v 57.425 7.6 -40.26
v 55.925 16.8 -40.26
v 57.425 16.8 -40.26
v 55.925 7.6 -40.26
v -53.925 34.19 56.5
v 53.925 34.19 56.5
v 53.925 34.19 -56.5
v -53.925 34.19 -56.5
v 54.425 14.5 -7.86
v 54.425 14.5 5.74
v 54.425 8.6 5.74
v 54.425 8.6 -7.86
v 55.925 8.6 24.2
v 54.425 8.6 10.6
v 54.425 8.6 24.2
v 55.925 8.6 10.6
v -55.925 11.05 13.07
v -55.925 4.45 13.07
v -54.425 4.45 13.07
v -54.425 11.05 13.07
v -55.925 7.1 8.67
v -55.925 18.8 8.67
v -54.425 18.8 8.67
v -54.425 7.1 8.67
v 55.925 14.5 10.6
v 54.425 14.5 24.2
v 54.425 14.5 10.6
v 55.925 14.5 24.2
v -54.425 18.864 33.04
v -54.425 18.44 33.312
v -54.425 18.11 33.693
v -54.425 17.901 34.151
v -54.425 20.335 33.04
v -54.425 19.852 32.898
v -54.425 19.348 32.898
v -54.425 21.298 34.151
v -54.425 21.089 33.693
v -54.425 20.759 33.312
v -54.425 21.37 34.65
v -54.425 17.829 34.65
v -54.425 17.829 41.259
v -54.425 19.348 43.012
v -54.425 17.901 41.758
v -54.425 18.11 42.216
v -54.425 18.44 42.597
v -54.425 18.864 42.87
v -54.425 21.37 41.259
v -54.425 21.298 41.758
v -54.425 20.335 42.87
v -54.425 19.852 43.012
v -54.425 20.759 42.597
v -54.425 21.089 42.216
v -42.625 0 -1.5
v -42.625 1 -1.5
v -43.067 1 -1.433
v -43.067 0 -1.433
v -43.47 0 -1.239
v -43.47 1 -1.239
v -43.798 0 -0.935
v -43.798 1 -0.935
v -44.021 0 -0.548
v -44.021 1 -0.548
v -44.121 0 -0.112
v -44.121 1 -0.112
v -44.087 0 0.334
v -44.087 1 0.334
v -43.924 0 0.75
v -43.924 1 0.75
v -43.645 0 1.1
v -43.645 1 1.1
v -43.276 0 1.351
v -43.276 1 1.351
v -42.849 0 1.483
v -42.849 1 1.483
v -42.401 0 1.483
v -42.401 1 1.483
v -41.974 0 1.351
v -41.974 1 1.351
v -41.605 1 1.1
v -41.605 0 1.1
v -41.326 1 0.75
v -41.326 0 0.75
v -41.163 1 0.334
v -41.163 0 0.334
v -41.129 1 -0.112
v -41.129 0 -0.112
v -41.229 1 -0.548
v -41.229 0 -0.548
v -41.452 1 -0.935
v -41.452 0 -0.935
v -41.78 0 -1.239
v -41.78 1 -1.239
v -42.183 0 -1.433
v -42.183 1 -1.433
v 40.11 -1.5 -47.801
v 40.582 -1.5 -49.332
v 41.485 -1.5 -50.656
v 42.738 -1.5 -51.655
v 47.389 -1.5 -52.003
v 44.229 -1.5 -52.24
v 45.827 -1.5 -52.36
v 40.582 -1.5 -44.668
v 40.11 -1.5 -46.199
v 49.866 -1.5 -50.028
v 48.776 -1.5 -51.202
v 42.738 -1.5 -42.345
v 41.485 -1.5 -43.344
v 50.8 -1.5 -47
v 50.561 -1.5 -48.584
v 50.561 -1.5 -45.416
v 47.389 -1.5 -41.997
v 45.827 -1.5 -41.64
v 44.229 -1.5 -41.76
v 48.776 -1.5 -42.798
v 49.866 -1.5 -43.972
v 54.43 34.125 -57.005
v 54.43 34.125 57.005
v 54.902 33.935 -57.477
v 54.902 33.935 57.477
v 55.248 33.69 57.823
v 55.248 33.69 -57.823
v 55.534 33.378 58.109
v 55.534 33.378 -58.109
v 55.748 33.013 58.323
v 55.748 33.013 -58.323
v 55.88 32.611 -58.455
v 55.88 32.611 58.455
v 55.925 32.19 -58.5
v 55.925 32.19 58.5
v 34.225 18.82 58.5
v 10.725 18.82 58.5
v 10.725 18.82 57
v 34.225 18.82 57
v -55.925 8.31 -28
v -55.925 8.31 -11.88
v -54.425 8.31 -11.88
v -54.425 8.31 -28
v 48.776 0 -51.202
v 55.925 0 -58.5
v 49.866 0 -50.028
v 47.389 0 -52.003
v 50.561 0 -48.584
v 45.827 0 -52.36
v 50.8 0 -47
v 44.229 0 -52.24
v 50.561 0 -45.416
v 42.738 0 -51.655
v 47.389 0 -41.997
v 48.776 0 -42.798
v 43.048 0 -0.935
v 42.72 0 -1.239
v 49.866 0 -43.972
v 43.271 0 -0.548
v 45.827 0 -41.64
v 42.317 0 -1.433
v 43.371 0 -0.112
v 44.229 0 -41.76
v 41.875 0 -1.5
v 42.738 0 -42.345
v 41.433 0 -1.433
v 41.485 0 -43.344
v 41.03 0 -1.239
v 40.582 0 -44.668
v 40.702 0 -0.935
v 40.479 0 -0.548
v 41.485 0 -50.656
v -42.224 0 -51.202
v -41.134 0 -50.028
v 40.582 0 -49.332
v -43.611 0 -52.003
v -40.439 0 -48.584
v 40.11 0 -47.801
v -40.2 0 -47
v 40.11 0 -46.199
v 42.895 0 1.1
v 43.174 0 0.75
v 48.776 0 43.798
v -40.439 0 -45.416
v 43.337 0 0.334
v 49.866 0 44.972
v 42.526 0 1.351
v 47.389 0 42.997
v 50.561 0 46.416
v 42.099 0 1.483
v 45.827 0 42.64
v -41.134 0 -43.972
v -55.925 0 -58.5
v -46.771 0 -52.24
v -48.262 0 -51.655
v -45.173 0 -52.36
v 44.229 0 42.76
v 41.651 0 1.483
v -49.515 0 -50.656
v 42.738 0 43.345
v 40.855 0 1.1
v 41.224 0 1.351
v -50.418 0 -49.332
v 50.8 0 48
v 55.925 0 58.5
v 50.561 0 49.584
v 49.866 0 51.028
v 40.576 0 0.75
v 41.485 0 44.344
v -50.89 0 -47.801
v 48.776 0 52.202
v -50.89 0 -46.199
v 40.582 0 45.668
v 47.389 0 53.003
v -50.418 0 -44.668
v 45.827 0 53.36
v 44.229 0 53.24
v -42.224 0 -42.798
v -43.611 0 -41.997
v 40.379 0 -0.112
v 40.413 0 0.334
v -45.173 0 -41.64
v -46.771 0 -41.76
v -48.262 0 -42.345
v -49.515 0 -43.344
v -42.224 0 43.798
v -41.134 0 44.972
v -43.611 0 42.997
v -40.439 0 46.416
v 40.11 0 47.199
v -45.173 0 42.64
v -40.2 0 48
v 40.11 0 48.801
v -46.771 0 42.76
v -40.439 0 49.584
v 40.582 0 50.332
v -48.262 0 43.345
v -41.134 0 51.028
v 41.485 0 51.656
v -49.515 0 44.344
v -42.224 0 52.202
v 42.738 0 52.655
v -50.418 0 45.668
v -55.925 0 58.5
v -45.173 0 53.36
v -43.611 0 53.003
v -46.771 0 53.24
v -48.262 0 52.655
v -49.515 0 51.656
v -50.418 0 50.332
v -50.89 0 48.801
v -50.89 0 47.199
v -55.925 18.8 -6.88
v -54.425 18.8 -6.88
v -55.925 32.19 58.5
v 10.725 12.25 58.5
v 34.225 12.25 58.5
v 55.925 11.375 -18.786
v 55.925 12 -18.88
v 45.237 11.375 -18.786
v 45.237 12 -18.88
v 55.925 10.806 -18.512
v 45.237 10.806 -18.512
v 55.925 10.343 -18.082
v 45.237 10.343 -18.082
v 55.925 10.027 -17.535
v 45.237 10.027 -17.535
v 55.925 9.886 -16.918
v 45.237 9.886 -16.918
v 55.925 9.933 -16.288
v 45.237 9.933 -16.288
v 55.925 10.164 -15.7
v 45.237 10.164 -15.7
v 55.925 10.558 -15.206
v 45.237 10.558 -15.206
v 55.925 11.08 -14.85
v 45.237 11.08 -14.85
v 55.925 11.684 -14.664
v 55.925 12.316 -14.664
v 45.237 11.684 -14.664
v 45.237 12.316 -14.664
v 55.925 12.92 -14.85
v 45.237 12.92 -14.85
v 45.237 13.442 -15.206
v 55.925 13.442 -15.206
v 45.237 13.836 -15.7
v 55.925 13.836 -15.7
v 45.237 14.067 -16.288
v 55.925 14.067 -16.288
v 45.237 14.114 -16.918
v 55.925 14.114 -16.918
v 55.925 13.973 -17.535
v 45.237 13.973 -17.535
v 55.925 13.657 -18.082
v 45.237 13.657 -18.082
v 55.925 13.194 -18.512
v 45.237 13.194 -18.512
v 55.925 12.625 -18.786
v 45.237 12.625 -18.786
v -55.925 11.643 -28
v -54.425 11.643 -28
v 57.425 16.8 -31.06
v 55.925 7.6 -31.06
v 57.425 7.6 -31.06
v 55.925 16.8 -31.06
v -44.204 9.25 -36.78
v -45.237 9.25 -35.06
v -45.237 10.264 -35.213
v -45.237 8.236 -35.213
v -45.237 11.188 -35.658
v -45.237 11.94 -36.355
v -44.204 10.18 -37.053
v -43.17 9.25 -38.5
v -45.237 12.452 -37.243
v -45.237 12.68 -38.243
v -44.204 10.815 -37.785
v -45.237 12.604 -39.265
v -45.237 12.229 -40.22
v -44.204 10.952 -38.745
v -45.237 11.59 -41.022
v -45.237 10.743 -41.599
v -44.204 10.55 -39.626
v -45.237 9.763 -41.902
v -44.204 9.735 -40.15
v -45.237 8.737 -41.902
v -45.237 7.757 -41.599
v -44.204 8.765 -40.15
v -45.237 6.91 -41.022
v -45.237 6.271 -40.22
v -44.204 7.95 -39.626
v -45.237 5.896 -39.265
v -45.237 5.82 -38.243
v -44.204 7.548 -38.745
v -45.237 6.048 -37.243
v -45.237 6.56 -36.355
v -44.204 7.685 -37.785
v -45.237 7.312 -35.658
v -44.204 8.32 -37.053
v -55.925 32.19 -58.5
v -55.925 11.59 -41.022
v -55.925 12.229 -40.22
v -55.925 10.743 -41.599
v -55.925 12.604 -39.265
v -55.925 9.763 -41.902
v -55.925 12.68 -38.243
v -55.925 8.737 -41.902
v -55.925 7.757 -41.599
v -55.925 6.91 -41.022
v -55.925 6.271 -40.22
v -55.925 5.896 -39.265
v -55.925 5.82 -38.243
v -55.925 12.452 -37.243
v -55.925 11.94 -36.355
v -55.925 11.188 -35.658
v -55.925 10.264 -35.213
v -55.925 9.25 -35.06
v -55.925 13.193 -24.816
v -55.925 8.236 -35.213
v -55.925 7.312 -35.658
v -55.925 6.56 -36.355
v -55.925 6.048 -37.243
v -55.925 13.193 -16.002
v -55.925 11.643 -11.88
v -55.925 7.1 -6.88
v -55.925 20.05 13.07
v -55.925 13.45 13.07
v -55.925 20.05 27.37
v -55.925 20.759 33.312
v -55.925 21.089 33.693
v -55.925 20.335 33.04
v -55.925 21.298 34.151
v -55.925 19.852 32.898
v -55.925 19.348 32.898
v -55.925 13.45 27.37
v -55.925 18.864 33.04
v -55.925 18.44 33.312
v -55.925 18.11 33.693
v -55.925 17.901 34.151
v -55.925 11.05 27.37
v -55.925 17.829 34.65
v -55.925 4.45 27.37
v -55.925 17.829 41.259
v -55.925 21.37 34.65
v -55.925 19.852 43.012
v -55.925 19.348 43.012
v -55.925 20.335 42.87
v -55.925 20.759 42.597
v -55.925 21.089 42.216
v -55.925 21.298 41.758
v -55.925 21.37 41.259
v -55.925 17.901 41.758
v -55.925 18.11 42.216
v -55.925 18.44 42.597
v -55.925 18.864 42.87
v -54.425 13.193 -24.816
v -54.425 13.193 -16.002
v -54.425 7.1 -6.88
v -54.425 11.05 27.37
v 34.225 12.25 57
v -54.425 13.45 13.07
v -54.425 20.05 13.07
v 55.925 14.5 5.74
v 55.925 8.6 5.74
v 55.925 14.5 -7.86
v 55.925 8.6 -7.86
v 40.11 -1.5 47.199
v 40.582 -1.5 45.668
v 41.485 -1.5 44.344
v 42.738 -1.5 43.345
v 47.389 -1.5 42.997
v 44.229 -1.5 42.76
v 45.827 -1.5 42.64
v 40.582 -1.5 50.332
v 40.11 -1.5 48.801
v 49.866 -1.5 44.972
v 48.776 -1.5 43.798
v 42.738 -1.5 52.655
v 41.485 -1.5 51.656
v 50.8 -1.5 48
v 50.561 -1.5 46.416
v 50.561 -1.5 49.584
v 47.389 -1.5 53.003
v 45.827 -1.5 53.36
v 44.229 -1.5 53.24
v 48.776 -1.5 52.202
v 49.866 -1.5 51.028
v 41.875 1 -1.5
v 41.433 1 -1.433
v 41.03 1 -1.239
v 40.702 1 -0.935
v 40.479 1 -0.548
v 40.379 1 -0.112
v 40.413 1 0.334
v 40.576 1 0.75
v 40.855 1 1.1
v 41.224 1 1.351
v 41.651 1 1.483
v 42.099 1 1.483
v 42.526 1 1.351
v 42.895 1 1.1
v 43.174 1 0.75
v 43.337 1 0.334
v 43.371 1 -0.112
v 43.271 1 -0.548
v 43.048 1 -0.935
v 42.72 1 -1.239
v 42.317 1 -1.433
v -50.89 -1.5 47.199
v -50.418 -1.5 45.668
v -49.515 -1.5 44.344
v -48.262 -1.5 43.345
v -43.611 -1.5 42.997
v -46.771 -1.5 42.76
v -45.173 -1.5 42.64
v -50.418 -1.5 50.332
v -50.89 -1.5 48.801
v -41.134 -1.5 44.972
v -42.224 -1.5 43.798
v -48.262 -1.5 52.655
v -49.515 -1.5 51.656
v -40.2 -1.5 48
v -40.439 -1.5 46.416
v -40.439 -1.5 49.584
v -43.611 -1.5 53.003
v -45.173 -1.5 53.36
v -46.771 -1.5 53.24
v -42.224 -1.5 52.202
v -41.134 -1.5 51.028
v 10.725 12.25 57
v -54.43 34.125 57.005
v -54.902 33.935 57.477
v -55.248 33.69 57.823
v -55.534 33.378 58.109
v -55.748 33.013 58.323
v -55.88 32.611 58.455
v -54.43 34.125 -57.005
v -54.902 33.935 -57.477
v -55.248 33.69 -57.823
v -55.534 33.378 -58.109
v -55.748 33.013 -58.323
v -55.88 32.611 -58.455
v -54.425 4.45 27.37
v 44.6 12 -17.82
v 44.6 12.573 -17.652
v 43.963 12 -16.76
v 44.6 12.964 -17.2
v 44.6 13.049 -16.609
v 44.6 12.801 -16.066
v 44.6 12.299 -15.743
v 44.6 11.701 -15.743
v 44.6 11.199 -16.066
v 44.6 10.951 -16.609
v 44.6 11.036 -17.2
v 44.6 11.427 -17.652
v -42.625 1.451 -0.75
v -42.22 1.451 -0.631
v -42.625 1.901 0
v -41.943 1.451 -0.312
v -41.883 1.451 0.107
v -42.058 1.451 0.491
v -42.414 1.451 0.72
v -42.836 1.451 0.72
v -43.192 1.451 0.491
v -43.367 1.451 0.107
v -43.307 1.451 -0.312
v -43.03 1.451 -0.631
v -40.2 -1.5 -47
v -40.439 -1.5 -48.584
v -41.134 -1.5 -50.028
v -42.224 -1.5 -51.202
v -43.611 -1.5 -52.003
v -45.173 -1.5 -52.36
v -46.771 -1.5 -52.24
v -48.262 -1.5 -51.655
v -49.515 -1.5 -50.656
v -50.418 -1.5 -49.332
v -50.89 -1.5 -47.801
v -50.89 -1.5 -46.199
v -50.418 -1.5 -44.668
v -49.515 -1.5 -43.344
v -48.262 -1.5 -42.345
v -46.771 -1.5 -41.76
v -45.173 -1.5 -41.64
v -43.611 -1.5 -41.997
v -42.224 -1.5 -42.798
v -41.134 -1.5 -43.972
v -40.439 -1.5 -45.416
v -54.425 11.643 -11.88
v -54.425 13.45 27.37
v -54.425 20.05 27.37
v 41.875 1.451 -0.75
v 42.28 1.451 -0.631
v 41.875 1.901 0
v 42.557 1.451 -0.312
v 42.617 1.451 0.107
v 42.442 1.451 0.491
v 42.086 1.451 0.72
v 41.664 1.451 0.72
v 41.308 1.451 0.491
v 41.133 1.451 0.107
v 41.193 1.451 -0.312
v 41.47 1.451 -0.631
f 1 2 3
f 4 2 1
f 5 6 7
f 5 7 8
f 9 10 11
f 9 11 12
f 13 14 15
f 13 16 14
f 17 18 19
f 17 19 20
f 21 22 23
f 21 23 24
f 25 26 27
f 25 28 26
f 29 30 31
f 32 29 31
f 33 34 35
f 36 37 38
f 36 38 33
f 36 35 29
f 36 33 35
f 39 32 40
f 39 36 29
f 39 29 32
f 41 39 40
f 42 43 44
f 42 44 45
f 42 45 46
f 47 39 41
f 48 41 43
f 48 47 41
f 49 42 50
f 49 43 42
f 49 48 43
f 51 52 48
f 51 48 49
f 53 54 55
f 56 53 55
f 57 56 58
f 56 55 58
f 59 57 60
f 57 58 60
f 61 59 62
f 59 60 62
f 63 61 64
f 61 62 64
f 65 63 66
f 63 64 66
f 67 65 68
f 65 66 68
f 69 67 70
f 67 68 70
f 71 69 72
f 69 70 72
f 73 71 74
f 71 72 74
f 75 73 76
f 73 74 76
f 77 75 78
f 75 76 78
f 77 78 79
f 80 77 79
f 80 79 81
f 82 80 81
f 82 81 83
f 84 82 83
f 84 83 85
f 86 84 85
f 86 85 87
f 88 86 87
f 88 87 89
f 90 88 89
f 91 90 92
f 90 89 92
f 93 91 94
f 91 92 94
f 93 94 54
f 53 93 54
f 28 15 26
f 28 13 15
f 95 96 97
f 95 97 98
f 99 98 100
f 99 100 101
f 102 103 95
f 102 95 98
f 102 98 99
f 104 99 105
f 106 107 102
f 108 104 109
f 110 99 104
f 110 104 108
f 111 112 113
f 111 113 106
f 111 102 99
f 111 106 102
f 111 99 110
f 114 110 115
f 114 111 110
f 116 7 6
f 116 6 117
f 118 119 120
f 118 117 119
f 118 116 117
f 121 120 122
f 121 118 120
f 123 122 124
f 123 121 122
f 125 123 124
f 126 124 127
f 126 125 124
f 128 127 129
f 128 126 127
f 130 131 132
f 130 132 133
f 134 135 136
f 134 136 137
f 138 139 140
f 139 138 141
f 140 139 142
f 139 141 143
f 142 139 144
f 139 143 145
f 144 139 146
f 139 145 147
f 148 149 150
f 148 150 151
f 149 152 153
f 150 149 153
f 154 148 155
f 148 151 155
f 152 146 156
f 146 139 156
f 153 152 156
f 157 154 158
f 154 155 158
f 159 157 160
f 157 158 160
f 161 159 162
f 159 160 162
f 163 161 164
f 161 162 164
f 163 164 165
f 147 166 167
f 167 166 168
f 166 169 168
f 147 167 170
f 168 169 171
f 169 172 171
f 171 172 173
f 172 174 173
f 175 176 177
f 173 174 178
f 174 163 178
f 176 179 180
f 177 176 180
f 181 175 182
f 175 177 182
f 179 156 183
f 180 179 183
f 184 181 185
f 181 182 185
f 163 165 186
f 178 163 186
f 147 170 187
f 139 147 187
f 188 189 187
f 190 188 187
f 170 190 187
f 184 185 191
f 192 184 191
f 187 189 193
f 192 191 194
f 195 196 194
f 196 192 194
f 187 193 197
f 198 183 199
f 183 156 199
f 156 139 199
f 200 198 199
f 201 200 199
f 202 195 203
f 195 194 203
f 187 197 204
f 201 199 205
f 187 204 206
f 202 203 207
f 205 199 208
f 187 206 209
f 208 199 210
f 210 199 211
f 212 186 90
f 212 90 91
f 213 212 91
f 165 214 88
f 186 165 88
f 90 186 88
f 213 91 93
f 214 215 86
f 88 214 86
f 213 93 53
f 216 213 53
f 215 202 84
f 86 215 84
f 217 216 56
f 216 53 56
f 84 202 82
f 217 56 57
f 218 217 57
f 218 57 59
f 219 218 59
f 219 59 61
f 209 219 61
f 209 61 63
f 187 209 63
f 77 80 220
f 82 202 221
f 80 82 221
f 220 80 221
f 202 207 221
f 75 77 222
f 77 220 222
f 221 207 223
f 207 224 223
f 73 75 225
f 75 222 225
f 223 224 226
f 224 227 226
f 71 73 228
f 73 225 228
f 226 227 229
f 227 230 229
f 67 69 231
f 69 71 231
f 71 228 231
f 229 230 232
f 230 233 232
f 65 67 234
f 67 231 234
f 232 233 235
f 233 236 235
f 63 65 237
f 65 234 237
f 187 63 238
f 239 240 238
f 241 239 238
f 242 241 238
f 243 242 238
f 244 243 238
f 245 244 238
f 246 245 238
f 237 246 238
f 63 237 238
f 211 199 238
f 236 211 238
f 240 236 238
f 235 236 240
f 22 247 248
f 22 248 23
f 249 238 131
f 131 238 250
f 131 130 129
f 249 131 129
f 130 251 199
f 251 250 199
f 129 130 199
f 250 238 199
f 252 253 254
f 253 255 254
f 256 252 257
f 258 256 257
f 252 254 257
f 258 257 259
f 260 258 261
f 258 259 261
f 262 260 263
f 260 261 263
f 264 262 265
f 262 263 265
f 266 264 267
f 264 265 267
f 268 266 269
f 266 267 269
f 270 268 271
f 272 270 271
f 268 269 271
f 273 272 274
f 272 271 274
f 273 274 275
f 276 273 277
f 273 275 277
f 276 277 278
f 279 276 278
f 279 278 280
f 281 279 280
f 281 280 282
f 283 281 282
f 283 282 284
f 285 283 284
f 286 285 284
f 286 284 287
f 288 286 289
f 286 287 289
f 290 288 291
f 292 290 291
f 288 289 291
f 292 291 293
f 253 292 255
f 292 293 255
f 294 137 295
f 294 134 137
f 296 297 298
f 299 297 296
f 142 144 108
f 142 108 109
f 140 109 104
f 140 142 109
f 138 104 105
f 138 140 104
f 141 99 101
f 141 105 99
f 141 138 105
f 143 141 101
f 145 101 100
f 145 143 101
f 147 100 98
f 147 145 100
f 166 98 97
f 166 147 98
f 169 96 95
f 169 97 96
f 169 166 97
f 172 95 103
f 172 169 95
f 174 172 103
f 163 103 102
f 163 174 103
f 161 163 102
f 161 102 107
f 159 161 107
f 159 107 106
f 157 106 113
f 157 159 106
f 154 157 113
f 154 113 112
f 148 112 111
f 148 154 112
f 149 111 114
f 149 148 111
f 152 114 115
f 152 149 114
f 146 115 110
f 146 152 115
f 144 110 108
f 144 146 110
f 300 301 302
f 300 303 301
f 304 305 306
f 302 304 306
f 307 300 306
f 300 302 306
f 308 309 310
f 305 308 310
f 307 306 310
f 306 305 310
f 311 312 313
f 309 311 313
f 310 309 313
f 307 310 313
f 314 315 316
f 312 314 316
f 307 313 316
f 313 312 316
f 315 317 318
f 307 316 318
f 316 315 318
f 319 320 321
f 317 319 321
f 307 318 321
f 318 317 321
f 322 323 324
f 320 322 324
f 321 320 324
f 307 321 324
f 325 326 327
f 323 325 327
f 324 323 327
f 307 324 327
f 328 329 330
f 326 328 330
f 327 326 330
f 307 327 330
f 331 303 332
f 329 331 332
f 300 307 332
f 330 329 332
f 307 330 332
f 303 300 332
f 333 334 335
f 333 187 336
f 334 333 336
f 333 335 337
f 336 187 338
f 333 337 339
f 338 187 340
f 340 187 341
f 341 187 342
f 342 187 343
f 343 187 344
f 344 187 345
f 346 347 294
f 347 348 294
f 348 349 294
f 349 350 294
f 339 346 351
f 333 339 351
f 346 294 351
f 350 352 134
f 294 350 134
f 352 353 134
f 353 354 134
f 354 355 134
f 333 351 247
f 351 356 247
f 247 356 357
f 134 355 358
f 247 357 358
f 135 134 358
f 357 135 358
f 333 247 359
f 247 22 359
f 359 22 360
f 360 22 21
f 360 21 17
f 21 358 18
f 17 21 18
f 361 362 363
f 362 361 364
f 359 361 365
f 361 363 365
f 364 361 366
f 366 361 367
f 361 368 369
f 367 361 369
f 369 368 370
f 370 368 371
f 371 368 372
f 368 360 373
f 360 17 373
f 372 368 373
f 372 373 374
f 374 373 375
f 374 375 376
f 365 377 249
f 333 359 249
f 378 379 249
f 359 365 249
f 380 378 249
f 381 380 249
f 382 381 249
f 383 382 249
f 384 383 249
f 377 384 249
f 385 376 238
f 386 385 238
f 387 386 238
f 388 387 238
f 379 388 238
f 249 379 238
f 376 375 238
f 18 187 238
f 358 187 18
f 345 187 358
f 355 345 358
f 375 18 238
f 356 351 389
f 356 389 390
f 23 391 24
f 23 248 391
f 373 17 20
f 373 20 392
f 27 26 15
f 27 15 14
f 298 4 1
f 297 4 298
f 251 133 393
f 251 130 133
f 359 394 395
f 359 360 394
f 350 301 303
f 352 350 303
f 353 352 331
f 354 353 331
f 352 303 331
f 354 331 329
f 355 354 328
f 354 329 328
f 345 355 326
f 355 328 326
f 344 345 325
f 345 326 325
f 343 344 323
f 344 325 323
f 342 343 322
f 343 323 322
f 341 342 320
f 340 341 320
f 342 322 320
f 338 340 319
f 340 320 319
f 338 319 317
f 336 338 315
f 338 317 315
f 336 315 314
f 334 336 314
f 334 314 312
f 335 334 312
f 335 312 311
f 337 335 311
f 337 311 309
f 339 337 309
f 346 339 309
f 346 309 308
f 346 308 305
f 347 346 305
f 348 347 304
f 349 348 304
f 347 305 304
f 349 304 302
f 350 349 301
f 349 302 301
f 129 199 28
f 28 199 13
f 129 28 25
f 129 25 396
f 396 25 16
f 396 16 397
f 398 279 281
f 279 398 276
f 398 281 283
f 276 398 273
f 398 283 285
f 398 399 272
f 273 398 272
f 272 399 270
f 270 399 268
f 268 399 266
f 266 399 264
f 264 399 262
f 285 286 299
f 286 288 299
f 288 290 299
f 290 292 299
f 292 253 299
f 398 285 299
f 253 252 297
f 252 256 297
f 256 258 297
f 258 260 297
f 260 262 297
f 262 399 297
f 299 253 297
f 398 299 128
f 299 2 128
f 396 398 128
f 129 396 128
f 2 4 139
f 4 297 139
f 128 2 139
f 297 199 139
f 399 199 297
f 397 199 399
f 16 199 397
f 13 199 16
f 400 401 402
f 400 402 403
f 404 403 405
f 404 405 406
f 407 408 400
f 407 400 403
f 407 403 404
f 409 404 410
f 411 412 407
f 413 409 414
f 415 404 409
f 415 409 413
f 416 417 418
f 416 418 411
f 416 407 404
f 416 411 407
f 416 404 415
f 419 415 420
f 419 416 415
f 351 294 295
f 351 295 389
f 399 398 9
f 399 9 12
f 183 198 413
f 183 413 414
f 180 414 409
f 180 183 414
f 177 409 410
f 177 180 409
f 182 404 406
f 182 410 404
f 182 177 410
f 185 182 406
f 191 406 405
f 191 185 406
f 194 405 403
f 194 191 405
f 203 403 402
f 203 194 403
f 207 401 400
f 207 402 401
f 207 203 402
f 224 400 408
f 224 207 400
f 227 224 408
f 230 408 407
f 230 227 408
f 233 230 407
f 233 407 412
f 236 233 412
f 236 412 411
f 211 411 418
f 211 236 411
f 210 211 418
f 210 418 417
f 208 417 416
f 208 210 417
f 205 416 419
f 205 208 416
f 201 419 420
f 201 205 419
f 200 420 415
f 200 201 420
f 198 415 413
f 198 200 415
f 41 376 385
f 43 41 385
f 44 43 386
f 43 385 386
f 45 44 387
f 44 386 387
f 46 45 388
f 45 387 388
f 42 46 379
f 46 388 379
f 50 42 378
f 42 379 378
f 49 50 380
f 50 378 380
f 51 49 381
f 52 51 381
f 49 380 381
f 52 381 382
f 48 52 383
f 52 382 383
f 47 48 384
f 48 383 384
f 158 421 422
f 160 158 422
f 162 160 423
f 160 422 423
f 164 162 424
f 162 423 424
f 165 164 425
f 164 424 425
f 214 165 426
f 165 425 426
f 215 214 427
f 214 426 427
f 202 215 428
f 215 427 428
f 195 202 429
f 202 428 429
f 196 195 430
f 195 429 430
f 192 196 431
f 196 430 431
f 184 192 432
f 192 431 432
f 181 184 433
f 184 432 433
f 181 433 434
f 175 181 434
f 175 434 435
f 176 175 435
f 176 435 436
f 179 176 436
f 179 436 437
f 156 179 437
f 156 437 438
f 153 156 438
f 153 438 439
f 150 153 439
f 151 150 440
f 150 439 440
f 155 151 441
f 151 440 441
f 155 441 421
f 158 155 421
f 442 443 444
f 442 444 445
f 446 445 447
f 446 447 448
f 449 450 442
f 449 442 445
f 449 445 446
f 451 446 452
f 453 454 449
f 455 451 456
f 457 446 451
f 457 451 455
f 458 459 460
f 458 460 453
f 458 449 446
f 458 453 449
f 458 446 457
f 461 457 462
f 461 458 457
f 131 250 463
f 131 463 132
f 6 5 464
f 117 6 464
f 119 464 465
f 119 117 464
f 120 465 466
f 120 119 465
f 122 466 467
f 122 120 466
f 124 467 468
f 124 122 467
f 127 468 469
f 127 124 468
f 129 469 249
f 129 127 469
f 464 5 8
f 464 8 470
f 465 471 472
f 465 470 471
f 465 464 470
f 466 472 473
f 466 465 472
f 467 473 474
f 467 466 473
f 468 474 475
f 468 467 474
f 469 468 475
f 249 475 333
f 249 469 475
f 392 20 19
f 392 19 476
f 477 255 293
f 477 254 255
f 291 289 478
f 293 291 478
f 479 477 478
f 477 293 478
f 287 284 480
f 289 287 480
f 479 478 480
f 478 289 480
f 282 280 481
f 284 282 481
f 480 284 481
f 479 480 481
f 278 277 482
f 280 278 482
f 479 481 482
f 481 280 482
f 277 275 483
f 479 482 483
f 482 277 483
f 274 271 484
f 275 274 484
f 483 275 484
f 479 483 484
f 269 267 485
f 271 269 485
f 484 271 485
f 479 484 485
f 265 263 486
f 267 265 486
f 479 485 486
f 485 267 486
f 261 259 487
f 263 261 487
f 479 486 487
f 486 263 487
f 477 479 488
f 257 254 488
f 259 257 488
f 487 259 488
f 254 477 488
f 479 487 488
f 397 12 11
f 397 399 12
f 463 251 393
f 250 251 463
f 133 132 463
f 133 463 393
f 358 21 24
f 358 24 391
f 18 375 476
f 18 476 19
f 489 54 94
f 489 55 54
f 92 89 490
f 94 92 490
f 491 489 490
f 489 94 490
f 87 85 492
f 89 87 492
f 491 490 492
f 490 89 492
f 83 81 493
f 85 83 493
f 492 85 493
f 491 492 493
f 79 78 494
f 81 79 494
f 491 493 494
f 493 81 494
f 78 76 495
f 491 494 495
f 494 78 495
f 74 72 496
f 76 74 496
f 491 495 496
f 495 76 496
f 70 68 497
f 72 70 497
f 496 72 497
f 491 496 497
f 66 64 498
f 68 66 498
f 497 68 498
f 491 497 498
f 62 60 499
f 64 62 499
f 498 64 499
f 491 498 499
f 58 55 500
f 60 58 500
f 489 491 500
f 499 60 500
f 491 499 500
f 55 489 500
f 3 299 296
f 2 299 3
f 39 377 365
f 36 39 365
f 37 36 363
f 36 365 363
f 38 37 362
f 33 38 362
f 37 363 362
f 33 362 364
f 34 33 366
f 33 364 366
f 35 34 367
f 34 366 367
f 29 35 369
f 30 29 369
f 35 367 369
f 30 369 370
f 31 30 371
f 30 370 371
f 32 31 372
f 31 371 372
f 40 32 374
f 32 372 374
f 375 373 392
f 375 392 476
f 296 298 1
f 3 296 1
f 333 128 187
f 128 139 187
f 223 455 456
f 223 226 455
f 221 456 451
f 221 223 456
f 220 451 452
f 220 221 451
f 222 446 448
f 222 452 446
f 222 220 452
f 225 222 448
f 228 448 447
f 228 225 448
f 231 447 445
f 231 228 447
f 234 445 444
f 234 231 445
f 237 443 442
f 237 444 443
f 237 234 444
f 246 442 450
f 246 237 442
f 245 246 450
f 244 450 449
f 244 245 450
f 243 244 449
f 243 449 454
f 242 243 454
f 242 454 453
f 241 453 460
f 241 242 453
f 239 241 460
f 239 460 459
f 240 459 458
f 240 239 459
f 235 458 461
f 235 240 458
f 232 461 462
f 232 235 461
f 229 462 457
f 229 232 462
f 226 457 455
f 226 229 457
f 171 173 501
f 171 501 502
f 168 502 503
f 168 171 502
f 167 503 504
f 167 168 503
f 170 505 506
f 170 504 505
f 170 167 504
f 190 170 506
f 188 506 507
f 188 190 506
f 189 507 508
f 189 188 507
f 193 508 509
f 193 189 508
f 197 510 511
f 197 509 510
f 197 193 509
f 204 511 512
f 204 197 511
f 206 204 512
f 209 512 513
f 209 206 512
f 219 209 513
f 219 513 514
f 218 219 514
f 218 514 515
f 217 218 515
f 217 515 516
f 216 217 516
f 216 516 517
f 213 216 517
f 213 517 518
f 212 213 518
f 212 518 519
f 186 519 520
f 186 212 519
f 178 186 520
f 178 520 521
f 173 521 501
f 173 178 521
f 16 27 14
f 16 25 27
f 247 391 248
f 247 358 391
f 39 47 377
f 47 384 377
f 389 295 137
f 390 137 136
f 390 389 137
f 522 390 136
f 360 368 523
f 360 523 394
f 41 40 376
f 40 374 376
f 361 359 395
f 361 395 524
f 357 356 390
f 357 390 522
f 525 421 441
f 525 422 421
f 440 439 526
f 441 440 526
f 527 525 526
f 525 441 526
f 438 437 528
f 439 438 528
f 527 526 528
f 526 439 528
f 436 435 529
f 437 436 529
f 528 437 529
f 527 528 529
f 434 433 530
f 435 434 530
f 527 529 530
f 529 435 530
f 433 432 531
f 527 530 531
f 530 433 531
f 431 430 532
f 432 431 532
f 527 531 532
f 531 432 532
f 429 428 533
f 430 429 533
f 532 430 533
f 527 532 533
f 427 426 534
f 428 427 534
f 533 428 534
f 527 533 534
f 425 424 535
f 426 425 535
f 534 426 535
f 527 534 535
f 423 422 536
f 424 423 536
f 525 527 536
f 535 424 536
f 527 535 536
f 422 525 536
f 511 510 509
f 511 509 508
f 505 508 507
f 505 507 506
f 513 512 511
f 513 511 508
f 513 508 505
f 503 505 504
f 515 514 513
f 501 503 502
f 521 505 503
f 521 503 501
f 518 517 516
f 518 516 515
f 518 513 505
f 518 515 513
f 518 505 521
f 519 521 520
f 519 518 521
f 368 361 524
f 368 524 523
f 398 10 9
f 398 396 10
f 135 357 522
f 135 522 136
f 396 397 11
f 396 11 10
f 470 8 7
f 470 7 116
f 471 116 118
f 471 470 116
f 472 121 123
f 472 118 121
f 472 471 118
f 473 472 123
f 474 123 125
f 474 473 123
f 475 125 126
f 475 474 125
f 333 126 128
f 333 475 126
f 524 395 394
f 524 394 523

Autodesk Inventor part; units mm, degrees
ref_plane "YZ Plane" through (0, 0, 0) normal (1, 0, 0) x (0, 1, 0)
ref_plane "XZ Plane" through (0, 0, 0) normal (0, 1, 0) x (-1, 0, 0)
ref_plane "XY Plane" through (0, 0, 0) normal (0, 0, 1) x (1, 0, 0)
sketch "Sketch1" plane through (0, 0, 0) normal (0, 1, 0) x (-1, 0, 0)
  line L0 (55.925, 58.5) -> (-55.925, 58.5)
  line L1 (-55.925, 58.5) -> (-55.925, -58.5)
  line L2 (-55.925, -58.5) -> (55.925, -58.5)
  line L3 (55.925, -58.5) -> (55.925, 58.5)
  line L4 (55.925, 58.5) -> (-55.925, -58.5) construction
  line L5 (-55.925, 58.5) -> (55.925, -58.5) construction
  point P0 (0, 0)
  dimension "d0" = 111.85
  dimension "d1" = 117
extrude "Extrusion1" add sketch "Sketch1" along normal blind 34.19
fillet "Fillet1" radius 2 4 edges at (0, 34.19, 58.5) (55.925, 34.19, 0) (0, 34.19, -58.5) (-55.925, 34.19, 0)
sketch "Sketch2" plane through (0, 0, 0) normal (0, -1, 0) x (1, 0, 0)
  circle A0 centre (45.425, 48) radius 5.375
  line L0 (55.925, 58.5) -> (55.925, -58.5) projected
  line L1 (-55.925, 58.5) -> (55.925, 58.5) projected
  circle A1 centre (-45.575, 48) radius 5.375
  circle A2 centre (45.425, -47) radius 5.375
  circle A3 centre (-45.575, -47) radius 5.375
  point P0 (0, 0)
  dimension "d5" = 10.75
  dimension "d6" = 10.5
  dimension "d7" = 10.5
  dimension "d10" = 91
  dimension "d13" = 95
extrude "Extrusion2" add sketch "Sketch2" along normal blind 1.5
sketch "Sketch4" plane through (0, 0, 0) normal (0, -1, 0) x (1, 0, 0)
  line L0 (-55.925, -58.5) -> (-55.925, 58.5) projected
  line L1 (-55.925, 58.5) -> (55.925, 58.5) projected
  point P0 (0, 0)
  point P1 (-42.625, 0)
  dimension "d32" = 13.3
  dimension "d33" = 58.5
hole "Hole2" at (-42.625, 0, 0) direction (0, 1, 0) diameter 3 depth 1 tip angle 118
pattern_linear "Rectangular Pattern1" count 2 spacing 84.5 along (1, 0, 0) of "Hole2"
sketch "Sketch5" plane through (55.925, 0, 58.5) normal (1, 0, 0) x (0, 0, -1)
  line L0 (34.3, 14.5) -> (47.9, 14.5)
  line L1 (47.9, 14.5) -> (47.9, 8.6)
  line L2 (47.9, 8.6) -> (34.3, 8.6)
  line L3 (34.3, 8.6) -> (34.3, 14.5)
  line L4 (34.3, 14.5) -> (47.9, 8.6) construction
  line L5 (47.9, 14.5) -> (34.3, 8.6) construction
  line L6 (52.76, 14.5) -> (66.36, 14.5)
  line L7 (66.36, 14.5) -> (66.36, 8.6)
  line L8 (66.36, 8.6) -> (52.76, 8.6)
  line L9 (52.76, 8.6) -> (52.76, 14.5)
  line L10 (52.76, 14.5) -> (66.36, 8.6) construction
  line L11 (66.36, 14.5) -> (52.76, 8.6) construction
  line L12 (0, 0) -> (117, 0) projected
  line L13 (0, 0) -> (0, 32.19) projected
  point P0 (58.5, 0)
  point P1 (41.1, 11.55)
  point P2 (59.56, 11.55)
  dimension "d37" = 13.6
  dimension "d38" = 5.9
  dimension "d39" = 13.6
  dimension "d40" = 5.9
  dimension "d41" = 8.6
  dimension "d42" = 34.3
  dimension "d43" = 4.86
  dimension "d44" = 8.6
extrude "Extrusion3" cut sketch "Sketch5" against normal blind 1.5
sketch "Sketch6" plane through (55.925, 0, 58.5) normal (1, 0, 0) x (0, 0, -1)
  line L0 (66.36, 14.5) -> (66.36, 8.6) projected
  line L1 (0, 0) -> (117, 0) projected
  point P0 (58.5, 0)
  point P1 (75.26, 12)
  dimension "d54" = 8.9
  dimension "d55" = 12
hole "Hole3" at (55.925, 12, -16.76) direction (-1, 0, 0) diameter 4.24 depth 10.688 tip angle 118
sketch "Sketch7" plane through (-55.925, 0, -58.5) normal (-1, 0, 0) x (0, 0, 1)
  line L0 (0, 0) -> (117, 0) projected
  line L1 (0, 0) -> (0, 32.19) projected
  point P0 (58.5, 0)
  point P1 (20, 9.25)
  dimension "d56" = 9.25
  dimension "d64" = 20
hole "Hole4" at (-55.925, 9.25, -38.5) direction (1, 0, 0) diameter 6.88 depth 10.688 tip angle 118
sketch "Sketch8" plane through (-55.925, 0, -58.5) normal (-1, 0, 0) x (0, 0, 1)
  line L0 (33.6837, 13.1926) -> (42.498, 13.1926)
  line L1 (46.62, 11.6426) -> (46.62, 8.31)
  line L2 (46.62, 8.31) -> (30.5, 8.31)
  line L3 (30.5, 8.31) -> (30.5, 11.6426)
  line L4 (30.5, 14.87) -> (46.62, 8.31) construction
  line L5 (46.62, 14.87) -> (30.5, 8.31) construction
  circle A0 centre (20, 9.25) radius 3.44 projected
  line L6 (0, 0) -> (117, 0) projected
  line L7 (30.5, 11.6426) -> (33.6837, 13.1926)
  line L8 (42.498, 13.1926) -> (46.62, 11.6426)
  point P0 (58.5, 0)
  point P1 (38.56, 11.59)
  dimension "d65" = 16.12
  dimension "d66" = 6.56
  dimension "d67" = 10.5
  dimension "d68" = 8.31
  dimension "d69" = 1.55
  dimension "d70" = 1.55
  dimension "d71" = 8.8143
extrude "Extrusion4" cut sketch "Sketch8" against normal blind 1.5 contours L0 L8 L1 L2 L3 L7
sketch "Sketch10" plane through (-55.925, 0, -58.5) normal (-1, 0, 0) x (0, 0, 1)
  line L0 (51.62, 18.8) -> (67.17, 18.8)
  line L1 (67.17, 18.8) -> (67.17, 7.1)
  line L2 (67.17, 7.1) -> (51.62, 7.1)
  line L3 (51.62, 7.1) -> (51.62, 18.8)
  line L4 (51.62, 18.8) -> (67.17, 7.1) construction
  line L5 (67.17, 18.8) -> (51.62, 7.1) construction
  line L6 (46.62, 11.6426) -> (46.62, 8.31) projected
  line L7 (0, 0) -> (117, 0) projected
  point P0 (58.5, 0)
  point P1 (59.395, 12.95)
  dimension "d81" = 15.55
  dimension "d82" = 11.7
  dimension "d84" = 5
  dimension "d85" = 7.1
extrude "Extrusion5" cut sketch "Sketch10" against normal blind 1.5
sketch "Sketch11" plane through (-55.925, 0, -58.5) normal (-1, 0, 0) x (0, 0, 1)
  line L0 (71.57, 20.05) -> (85.87, 20.05)
  line L1 (85.87, 20.05) -> (85.87, 13.45)
  line L2 (85.87, 13.45) -> (71.57, 13.45)
  line L3 (71.57, 13.45) -> (71.57, 20.05)
  line L4 (71.57, 20.05) -> (85.87, 13.45) construction
  line L5 (85.87, 20.05) -> (71.57, 13.45) construction
  line L6 (0, 32.19) -> (117, 32.19) projected
  line L7 (67.17, 18.8) -> (67.17, 7.1) projected
  line L8 (71.57, 11.05) -> (85.87, 11.05)
  line L9 (85.87, 11.05) -> (85.87, 4.45)
  line L10 (85.87, 4.45) -> (71.57, 4.45)
  line L11 (71.57, 4.45) -> (71.57, 11.05)
  point P0 (58.5, 0)
  point P1 (78.72, 16.75)
  point P2 (79.72, 17.75)
  dimension "d88" = 14.3
  dimension "d89" = 6.6
  dimension "d90" = 12.14
  dimension "d91" = 4.4
  dimension "d92" = 14.3
  dimension "d93" = 6.6
  dimension "d94" = 2.4
  dimension "d95" = 4.4
extrude "Extrusion6" cut sketch "Sketch11" against normal blind 1.5
sketch "Sketch12" plane through (-55.925, 0, -58.5) normal (-1, 0, 0) x (0, 0, 1)
  line L0 (93.15, 19.5997) -> (99.7593, 19.5997) construction
  line L1 (93.15, 17.8293) -> (99.7593, 17.8293)
  line L2 (99.7593, 21.37) -> (93.15, 21.37)
  arc A0 (93.15, 21.37) -> (93.15, 17.8293) centre (93.15, 19.5997) ccw
  arc A1 (99.7593, 17.8293) -> (99.7593, 21.37) centre (99.7593, 19.5997) ccw
  line L3 (0, 32.19) -> (117, 32.19) projected
  line L4 (85.87, 20.05) -> (85.87, 13.45) projected
  point P0 (58.5, 0)
  point P1 (96.4547, 19.5997)
  dimension "d98" = 10.15
  dimension "d99" = 10.82
  dimension "d100" = 7.28
extrude "Extrusion7" cut sketch "Sketch12" against normal blind 1.5
sketch "Sketch13" plane through (55.925, 0, 58.5) normal (1, 0, 0) x (0, 0, -1)
  line L0 (89.56, 16.8) -> (98.76, 16.8)
  line L1 (98.76, 16.8) -> (98.76, 7.6)
  line L2 (98.76, 7.6) -> (89.56, 7.6)
  line L3 (89.56, 7.6) -> (89.56, 16.8)
  line L4 (89.56, 16.8) -> (98.76, 7.6) construction
  line L5 (98.76, 16.8) -> (89.56, 7.6) construction
  circle A0 centre (75.26, 12) radius 2.12 projected
  line L6 (0, 0) -> (117, 0) projected
  point P0 (58.5, 0)
  point P1 (94.16, 12.2)
  dimension "d103" = 14.3
  dimension "d104" = 7.6
  dimension "d105" = 9.2
  dimension "d106" = 9.2
extrude "Extrusion8" add sketch "Sketch13" along normal blind 1.5 contours L0 L1 L2 L3
sketch "Sketch14" plane through (-55.925, 0, 58.5) normal (0, 0, 1) x (1, 0, 0)
  line L0 (66.65, 18.82) -> (90.15, 18.82)
  line L1 (90.15, 18.82) -> (90.15, 12.25)
  line L2 (90.15, 12.25) -> (66.65, 12.25)
  line L3 (66.65, 12.25) -> (66.65, 18.82)
  line L4 (66.65, 18.82) -> (90.15, 12.25) construction
  line L5 (90.15, 18.82) -> (66.65, 12.25) construction
  line L6 (0, 0) -> (111.85, 0) projected
  line L7 (111.85, 0) -> (111.85, 32.19) projected
  point P0 (55.925, 0)
  point P1 (78.4, 15.535)
  dimension "d109" = 23.5
  dimension "d110" = 6.57
  dimension "d111" = 12.25
  dimension "d112" = 21.7
extrude "Extrusion9" cut sketch "Sketch14" against normal blind 1.5
properties part number "NUC_model"
